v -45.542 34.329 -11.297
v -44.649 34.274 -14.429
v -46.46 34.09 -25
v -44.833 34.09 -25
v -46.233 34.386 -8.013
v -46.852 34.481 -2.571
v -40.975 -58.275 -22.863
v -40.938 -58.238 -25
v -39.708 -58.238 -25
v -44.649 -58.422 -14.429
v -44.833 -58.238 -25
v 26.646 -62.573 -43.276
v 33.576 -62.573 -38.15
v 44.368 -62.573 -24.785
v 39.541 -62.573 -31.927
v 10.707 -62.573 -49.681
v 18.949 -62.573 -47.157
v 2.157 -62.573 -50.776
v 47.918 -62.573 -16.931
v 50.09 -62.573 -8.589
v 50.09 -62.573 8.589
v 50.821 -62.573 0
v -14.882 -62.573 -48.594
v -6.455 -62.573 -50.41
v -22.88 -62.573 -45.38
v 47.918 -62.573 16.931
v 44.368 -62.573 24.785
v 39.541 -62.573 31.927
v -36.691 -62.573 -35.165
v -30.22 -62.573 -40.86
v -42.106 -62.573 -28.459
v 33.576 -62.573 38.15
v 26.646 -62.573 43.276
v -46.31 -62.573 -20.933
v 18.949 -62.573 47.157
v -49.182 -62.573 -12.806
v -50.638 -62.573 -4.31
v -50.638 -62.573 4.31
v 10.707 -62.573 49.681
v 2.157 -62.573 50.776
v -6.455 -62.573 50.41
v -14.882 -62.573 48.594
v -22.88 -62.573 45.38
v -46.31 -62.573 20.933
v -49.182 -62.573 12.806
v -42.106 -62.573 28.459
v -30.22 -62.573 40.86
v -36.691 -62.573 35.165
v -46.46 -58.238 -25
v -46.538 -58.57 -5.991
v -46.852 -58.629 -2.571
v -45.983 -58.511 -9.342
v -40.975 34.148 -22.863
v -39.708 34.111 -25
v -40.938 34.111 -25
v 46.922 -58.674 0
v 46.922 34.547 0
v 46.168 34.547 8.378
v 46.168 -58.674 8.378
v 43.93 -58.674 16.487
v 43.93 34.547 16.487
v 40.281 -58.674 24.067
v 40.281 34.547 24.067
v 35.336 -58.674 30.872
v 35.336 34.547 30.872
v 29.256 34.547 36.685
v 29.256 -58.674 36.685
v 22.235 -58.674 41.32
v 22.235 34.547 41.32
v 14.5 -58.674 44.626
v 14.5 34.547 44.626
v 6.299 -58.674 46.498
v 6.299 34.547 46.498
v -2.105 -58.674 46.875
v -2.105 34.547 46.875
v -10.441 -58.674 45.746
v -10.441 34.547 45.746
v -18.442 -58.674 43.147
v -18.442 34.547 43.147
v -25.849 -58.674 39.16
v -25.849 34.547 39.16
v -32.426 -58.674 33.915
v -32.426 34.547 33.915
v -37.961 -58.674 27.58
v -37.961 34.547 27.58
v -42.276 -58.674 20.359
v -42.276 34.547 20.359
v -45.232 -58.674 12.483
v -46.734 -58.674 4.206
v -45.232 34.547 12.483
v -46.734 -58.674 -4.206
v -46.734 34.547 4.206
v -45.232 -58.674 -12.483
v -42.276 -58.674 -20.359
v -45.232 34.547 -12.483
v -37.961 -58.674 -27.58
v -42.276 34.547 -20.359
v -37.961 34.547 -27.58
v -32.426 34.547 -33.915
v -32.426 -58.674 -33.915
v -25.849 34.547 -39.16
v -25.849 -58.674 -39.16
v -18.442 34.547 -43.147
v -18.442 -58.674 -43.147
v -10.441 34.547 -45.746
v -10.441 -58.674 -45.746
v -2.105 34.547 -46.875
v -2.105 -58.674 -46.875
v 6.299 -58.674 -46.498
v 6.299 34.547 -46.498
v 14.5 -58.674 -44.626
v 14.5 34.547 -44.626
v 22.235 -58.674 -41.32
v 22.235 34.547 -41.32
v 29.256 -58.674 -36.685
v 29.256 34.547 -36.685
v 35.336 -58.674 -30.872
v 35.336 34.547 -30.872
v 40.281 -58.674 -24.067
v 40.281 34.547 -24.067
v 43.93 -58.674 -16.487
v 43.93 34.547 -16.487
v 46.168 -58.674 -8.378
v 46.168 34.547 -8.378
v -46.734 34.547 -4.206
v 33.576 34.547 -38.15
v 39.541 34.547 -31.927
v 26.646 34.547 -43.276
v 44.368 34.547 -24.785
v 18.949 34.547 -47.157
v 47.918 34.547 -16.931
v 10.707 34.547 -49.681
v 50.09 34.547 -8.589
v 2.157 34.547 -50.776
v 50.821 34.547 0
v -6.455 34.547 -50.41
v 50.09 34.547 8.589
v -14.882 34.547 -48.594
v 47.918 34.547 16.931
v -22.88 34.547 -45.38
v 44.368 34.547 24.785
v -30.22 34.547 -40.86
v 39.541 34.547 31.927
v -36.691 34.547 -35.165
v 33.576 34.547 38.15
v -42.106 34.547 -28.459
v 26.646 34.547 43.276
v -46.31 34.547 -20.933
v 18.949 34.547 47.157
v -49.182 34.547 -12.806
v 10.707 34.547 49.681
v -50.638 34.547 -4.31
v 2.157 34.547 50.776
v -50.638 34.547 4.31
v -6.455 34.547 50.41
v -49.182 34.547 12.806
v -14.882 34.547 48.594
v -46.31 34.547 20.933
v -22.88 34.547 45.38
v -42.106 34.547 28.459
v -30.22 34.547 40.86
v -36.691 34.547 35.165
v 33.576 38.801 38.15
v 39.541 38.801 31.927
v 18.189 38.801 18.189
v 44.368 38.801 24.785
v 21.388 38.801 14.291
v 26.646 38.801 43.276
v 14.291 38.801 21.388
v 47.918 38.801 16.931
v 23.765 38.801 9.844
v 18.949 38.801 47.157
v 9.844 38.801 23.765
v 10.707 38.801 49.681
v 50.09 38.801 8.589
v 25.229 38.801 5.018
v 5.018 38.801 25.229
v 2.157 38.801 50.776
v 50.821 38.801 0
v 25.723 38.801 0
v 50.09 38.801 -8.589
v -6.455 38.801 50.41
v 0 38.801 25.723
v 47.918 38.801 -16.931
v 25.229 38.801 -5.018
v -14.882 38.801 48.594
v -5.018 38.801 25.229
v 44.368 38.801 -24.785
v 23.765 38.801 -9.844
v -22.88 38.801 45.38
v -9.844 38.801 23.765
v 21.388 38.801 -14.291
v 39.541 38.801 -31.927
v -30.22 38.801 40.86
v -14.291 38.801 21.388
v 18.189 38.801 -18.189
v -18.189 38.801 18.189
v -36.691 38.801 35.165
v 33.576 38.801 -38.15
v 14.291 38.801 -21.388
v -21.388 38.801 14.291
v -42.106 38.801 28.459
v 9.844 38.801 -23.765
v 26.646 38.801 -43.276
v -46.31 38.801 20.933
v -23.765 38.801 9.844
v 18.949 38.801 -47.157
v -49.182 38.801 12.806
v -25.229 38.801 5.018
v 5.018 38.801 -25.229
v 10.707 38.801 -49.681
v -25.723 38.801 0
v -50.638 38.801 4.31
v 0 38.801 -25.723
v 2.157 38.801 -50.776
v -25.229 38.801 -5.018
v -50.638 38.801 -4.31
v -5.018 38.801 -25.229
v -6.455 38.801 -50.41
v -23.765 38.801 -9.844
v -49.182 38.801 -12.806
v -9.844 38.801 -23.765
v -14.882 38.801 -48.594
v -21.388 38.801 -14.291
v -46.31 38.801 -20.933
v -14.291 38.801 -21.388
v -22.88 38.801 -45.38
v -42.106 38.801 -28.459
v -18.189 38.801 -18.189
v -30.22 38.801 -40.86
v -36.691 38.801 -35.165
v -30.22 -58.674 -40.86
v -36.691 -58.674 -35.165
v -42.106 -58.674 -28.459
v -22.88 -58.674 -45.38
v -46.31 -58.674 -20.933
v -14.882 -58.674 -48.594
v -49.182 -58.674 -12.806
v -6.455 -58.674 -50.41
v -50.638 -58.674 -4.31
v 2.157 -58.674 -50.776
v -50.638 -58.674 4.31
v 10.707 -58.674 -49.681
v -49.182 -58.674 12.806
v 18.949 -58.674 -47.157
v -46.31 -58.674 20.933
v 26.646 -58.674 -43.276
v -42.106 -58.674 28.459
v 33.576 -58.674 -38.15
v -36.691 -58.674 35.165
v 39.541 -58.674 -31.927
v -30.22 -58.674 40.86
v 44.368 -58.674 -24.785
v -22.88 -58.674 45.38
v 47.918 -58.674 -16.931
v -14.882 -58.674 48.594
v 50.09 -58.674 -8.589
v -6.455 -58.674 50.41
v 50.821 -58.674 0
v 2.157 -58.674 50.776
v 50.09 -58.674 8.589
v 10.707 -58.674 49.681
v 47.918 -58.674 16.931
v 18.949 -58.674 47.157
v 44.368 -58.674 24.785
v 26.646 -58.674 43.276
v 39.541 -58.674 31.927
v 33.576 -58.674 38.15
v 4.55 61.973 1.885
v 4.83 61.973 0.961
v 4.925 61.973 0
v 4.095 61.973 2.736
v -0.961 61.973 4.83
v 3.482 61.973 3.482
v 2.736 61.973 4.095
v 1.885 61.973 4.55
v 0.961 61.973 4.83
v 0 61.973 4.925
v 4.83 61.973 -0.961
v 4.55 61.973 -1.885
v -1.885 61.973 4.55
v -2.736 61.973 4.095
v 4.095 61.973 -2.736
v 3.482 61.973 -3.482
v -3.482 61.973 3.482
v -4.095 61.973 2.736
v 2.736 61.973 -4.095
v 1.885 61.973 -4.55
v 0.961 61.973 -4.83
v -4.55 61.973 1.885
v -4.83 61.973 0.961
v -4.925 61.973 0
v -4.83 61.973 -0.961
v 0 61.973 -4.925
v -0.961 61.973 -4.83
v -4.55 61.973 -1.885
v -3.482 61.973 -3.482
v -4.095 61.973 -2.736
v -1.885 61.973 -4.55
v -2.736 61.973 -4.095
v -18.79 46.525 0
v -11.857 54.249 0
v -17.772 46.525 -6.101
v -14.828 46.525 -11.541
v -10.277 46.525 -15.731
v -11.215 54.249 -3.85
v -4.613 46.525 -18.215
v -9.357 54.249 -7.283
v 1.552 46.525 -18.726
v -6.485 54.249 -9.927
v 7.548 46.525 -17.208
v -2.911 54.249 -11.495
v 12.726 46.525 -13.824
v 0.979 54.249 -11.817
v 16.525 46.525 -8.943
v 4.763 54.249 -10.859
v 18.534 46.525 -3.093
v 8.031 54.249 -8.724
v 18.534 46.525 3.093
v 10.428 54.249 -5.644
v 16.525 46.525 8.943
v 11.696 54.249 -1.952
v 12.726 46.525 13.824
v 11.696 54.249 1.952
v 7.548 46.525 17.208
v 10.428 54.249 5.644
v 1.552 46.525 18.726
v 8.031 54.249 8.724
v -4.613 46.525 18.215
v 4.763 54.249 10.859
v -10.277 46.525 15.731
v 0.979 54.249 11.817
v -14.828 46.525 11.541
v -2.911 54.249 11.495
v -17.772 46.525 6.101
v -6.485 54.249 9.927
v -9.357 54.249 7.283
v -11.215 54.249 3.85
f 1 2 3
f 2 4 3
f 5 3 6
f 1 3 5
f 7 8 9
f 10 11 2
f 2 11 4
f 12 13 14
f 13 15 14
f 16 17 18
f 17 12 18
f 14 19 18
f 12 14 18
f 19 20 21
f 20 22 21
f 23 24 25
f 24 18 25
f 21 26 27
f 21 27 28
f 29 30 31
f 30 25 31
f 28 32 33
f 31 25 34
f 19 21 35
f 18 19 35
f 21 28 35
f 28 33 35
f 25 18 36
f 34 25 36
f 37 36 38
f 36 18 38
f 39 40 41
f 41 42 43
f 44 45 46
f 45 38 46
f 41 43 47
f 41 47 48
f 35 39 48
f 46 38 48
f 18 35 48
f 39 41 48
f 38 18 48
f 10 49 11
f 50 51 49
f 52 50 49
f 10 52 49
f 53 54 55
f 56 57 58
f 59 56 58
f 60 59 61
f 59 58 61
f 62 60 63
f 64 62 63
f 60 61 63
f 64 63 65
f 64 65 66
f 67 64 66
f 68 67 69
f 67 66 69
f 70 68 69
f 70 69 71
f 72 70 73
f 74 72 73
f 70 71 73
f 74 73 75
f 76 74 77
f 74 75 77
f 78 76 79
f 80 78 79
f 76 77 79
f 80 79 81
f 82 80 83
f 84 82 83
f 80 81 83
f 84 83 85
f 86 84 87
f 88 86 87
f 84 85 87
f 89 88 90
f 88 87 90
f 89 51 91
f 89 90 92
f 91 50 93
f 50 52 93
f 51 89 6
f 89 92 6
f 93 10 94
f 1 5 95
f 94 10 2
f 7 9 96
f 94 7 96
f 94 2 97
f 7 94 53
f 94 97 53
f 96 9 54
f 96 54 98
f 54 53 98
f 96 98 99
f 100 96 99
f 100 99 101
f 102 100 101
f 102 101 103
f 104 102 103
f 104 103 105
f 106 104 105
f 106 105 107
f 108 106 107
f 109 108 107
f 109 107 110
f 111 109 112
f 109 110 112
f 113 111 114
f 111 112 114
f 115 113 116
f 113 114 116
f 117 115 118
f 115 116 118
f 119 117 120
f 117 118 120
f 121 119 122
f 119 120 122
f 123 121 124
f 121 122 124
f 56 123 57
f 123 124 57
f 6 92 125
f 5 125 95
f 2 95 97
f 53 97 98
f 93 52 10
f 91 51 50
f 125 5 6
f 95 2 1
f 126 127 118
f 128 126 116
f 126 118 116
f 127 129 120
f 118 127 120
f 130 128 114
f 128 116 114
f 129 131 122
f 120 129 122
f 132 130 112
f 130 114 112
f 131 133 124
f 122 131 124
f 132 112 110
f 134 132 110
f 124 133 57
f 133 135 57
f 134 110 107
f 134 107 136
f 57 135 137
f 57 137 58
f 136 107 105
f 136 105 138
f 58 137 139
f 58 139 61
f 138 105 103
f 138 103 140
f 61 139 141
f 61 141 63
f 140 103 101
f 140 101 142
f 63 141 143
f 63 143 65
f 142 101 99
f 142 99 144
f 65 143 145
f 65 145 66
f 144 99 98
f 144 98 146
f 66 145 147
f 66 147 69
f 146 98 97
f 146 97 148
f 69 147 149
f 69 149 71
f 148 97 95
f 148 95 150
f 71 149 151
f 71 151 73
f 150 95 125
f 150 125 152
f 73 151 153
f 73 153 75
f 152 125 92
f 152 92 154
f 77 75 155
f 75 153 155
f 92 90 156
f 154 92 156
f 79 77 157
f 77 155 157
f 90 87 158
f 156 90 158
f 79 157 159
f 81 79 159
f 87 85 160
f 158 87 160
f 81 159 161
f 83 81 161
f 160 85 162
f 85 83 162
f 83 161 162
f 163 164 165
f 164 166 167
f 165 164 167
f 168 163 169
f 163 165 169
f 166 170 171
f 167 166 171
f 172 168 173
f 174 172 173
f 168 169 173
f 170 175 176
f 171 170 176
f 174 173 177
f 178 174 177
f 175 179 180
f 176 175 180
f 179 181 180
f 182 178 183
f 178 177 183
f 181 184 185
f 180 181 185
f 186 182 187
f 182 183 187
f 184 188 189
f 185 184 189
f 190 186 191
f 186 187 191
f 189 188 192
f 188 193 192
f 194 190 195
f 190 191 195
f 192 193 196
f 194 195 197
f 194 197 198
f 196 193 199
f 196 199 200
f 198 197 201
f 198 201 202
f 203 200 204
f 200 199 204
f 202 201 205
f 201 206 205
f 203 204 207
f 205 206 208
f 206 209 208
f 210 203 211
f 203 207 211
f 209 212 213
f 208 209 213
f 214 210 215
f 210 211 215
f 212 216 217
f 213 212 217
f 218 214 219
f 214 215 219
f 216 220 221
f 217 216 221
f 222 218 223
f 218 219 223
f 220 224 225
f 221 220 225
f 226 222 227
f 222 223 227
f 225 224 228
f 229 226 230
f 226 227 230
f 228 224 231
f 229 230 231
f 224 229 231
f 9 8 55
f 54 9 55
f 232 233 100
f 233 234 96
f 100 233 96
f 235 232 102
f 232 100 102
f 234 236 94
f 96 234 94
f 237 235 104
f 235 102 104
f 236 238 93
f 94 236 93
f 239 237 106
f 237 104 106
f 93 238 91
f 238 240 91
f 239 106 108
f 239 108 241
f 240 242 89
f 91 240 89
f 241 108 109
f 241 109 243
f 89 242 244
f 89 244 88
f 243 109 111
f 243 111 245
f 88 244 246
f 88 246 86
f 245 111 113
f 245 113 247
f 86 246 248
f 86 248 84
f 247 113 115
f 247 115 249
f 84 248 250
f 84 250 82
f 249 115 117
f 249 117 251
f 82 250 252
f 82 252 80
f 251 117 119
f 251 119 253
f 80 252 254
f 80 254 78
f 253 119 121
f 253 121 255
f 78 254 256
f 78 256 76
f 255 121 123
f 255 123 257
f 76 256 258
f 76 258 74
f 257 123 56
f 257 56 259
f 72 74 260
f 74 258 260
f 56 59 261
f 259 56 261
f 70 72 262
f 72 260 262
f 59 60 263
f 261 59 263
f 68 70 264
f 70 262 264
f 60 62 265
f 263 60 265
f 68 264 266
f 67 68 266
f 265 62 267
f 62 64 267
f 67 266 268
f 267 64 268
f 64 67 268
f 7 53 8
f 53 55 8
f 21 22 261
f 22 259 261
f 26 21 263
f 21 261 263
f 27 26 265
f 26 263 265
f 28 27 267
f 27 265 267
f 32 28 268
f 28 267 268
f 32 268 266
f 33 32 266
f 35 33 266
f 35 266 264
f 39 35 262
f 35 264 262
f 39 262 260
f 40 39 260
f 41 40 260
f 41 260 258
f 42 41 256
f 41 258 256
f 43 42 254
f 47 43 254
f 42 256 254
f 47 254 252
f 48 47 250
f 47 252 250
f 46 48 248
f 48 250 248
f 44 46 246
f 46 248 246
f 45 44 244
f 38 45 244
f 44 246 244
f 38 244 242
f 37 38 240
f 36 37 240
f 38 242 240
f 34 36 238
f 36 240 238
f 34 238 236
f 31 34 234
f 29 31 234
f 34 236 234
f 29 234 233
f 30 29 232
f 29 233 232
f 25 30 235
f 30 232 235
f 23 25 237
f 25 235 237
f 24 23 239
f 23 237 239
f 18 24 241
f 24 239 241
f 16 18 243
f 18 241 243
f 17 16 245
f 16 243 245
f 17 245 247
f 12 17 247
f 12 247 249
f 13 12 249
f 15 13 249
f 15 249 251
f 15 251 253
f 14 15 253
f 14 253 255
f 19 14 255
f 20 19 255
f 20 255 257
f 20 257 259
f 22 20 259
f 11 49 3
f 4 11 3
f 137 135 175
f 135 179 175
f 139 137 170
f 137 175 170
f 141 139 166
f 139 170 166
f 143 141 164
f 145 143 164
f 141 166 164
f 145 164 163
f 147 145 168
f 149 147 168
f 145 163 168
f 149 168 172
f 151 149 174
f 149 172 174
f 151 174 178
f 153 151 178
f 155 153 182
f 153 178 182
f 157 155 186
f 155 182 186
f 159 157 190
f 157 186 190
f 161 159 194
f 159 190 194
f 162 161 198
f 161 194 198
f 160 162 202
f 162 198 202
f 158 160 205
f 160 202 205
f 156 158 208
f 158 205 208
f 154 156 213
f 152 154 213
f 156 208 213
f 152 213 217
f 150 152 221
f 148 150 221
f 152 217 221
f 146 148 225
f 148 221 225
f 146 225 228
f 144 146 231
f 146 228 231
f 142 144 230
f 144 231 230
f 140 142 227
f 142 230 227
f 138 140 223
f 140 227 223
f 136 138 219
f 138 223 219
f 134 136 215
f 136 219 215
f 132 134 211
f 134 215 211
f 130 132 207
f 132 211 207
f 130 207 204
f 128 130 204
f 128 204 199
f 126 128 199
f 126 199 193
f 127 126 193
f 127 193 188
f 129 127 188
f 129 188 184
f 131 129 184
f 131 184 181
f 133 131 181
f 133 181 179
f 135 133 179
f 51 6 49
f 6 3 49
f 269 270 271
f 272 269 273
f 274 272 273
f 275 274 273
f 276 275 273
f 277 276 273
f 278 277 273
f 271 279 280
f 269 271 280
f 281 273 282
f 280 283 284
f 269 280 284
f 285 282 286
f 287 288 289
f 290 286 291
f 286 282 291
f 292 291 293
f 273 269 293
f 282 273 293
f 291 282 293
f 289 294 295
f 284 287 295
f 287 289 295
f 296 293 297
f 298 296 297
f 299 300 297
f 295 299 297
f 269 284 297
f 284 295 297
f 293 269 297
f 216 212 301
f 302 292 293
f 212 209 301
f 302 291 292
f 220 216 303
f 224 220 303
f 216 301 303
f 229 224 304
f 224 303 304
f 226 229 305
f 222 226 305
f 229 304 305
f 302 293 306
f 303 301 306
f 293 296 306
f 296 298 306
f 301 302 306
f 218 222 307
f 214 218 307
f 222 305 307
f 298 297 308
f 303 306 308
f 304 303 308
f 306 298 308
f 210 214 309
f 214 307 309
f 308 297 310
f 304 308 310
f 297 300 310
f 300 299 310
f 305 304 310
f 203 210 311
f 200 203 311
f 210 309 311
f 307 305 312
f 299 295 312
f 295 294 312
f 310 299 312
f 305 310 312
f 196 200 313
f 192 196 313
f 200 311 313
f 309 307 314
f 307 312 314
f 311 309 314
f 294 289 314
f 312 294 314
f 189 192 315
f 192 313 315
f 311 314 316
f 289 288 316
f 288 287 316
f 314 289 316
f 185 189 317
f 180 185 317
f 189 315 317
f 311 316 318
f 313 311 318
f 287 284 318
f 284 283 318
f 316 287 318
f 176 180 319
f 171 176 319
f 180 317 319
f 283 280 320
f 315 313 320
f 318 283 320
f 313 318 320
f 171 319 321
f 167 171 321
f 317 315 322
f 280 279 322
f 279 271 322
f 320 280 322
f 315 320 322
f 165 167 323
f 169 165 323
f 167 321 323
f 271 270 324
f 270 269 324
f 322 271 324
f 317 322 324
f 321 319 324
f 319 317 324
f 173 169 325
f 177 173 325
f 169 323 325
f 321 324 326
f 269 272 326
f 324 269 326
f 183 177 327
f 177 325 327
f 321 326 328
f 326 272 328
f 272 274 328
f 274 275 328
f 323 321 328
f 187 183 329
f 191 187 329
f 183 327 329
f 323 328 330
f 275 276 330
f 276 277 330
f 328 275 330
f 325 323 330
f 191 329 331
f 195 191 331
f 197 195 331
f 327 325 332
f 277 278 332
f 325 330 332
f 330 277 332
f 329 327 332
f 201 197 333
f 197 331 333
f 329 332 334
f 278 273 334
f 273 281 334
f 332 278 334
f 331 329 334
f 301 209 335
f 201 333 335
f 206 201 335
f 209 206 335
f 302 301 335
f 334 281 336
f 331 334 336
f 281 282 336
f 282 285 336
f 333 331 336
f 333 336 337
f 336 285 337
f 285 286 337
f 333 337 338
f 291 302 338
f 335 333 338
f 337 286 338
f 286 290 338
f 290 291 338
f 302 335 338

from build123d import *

# Parameters (mm, degrees)
CROQUIS3_W              = 2.5
CROQUIS3_H              = 93.200468797
CROQUIS3_H_2            = 93.221326365
SALIENTE_EXTRUIR1_DEPTH = 25
SALIENTE_EXTRUIR1_TAPER = 1


with BuildPart() as part:
    # Croquis1 → Revolución1 (revolve)
    with BuildSketch(Plane.XY):
        Polygon((0, 38.800633525), (0, -62.573128225), (50.821461866, -62.573128225), (50.821461866, -58.674137389), (46.92247103, -58.674137389), (46.92247103, 34.547188976), (50.821461866, 34.547188976), (50.821461866, 38.800633525), align=None)
    revolve(axis=Axis((0, 38.800633525, 0), (0, -1, 0)))

    # Croquis3 → Saliente-Extruir1 (add)
    with BuildSketch(Plane.XY):
        with Locations((-45.646866178, -12.07390299)):
            Rectangle(CROQUIS3_W, CROQUIS3_H)
        with Locations((-40.124494984, -12.063474207)):
            Rectangle(CROQUIS3_W, CROQUIS3_H_2)
    extrude(amount=-SALIENTE_EXTRUIR1_DEPTH, taper=SALIENTE_EXTRUIR1_TAPER)

    # Croquis6 → Revolución2 (revolve)
    with BuildSketch(Plane.XY):
        Polygon((0, 61.973262814), (0, 34.547188976), (-30.940786447, 34.547188976), (-30.940786447, 38.800633525), (-25.72291089, 38.800633525), (-4.924695463, 61.973262814), align=None)
    revolve(axis=Axis((0, 61.973262814, 0), (0, -1, 0)))


solid = part.part
